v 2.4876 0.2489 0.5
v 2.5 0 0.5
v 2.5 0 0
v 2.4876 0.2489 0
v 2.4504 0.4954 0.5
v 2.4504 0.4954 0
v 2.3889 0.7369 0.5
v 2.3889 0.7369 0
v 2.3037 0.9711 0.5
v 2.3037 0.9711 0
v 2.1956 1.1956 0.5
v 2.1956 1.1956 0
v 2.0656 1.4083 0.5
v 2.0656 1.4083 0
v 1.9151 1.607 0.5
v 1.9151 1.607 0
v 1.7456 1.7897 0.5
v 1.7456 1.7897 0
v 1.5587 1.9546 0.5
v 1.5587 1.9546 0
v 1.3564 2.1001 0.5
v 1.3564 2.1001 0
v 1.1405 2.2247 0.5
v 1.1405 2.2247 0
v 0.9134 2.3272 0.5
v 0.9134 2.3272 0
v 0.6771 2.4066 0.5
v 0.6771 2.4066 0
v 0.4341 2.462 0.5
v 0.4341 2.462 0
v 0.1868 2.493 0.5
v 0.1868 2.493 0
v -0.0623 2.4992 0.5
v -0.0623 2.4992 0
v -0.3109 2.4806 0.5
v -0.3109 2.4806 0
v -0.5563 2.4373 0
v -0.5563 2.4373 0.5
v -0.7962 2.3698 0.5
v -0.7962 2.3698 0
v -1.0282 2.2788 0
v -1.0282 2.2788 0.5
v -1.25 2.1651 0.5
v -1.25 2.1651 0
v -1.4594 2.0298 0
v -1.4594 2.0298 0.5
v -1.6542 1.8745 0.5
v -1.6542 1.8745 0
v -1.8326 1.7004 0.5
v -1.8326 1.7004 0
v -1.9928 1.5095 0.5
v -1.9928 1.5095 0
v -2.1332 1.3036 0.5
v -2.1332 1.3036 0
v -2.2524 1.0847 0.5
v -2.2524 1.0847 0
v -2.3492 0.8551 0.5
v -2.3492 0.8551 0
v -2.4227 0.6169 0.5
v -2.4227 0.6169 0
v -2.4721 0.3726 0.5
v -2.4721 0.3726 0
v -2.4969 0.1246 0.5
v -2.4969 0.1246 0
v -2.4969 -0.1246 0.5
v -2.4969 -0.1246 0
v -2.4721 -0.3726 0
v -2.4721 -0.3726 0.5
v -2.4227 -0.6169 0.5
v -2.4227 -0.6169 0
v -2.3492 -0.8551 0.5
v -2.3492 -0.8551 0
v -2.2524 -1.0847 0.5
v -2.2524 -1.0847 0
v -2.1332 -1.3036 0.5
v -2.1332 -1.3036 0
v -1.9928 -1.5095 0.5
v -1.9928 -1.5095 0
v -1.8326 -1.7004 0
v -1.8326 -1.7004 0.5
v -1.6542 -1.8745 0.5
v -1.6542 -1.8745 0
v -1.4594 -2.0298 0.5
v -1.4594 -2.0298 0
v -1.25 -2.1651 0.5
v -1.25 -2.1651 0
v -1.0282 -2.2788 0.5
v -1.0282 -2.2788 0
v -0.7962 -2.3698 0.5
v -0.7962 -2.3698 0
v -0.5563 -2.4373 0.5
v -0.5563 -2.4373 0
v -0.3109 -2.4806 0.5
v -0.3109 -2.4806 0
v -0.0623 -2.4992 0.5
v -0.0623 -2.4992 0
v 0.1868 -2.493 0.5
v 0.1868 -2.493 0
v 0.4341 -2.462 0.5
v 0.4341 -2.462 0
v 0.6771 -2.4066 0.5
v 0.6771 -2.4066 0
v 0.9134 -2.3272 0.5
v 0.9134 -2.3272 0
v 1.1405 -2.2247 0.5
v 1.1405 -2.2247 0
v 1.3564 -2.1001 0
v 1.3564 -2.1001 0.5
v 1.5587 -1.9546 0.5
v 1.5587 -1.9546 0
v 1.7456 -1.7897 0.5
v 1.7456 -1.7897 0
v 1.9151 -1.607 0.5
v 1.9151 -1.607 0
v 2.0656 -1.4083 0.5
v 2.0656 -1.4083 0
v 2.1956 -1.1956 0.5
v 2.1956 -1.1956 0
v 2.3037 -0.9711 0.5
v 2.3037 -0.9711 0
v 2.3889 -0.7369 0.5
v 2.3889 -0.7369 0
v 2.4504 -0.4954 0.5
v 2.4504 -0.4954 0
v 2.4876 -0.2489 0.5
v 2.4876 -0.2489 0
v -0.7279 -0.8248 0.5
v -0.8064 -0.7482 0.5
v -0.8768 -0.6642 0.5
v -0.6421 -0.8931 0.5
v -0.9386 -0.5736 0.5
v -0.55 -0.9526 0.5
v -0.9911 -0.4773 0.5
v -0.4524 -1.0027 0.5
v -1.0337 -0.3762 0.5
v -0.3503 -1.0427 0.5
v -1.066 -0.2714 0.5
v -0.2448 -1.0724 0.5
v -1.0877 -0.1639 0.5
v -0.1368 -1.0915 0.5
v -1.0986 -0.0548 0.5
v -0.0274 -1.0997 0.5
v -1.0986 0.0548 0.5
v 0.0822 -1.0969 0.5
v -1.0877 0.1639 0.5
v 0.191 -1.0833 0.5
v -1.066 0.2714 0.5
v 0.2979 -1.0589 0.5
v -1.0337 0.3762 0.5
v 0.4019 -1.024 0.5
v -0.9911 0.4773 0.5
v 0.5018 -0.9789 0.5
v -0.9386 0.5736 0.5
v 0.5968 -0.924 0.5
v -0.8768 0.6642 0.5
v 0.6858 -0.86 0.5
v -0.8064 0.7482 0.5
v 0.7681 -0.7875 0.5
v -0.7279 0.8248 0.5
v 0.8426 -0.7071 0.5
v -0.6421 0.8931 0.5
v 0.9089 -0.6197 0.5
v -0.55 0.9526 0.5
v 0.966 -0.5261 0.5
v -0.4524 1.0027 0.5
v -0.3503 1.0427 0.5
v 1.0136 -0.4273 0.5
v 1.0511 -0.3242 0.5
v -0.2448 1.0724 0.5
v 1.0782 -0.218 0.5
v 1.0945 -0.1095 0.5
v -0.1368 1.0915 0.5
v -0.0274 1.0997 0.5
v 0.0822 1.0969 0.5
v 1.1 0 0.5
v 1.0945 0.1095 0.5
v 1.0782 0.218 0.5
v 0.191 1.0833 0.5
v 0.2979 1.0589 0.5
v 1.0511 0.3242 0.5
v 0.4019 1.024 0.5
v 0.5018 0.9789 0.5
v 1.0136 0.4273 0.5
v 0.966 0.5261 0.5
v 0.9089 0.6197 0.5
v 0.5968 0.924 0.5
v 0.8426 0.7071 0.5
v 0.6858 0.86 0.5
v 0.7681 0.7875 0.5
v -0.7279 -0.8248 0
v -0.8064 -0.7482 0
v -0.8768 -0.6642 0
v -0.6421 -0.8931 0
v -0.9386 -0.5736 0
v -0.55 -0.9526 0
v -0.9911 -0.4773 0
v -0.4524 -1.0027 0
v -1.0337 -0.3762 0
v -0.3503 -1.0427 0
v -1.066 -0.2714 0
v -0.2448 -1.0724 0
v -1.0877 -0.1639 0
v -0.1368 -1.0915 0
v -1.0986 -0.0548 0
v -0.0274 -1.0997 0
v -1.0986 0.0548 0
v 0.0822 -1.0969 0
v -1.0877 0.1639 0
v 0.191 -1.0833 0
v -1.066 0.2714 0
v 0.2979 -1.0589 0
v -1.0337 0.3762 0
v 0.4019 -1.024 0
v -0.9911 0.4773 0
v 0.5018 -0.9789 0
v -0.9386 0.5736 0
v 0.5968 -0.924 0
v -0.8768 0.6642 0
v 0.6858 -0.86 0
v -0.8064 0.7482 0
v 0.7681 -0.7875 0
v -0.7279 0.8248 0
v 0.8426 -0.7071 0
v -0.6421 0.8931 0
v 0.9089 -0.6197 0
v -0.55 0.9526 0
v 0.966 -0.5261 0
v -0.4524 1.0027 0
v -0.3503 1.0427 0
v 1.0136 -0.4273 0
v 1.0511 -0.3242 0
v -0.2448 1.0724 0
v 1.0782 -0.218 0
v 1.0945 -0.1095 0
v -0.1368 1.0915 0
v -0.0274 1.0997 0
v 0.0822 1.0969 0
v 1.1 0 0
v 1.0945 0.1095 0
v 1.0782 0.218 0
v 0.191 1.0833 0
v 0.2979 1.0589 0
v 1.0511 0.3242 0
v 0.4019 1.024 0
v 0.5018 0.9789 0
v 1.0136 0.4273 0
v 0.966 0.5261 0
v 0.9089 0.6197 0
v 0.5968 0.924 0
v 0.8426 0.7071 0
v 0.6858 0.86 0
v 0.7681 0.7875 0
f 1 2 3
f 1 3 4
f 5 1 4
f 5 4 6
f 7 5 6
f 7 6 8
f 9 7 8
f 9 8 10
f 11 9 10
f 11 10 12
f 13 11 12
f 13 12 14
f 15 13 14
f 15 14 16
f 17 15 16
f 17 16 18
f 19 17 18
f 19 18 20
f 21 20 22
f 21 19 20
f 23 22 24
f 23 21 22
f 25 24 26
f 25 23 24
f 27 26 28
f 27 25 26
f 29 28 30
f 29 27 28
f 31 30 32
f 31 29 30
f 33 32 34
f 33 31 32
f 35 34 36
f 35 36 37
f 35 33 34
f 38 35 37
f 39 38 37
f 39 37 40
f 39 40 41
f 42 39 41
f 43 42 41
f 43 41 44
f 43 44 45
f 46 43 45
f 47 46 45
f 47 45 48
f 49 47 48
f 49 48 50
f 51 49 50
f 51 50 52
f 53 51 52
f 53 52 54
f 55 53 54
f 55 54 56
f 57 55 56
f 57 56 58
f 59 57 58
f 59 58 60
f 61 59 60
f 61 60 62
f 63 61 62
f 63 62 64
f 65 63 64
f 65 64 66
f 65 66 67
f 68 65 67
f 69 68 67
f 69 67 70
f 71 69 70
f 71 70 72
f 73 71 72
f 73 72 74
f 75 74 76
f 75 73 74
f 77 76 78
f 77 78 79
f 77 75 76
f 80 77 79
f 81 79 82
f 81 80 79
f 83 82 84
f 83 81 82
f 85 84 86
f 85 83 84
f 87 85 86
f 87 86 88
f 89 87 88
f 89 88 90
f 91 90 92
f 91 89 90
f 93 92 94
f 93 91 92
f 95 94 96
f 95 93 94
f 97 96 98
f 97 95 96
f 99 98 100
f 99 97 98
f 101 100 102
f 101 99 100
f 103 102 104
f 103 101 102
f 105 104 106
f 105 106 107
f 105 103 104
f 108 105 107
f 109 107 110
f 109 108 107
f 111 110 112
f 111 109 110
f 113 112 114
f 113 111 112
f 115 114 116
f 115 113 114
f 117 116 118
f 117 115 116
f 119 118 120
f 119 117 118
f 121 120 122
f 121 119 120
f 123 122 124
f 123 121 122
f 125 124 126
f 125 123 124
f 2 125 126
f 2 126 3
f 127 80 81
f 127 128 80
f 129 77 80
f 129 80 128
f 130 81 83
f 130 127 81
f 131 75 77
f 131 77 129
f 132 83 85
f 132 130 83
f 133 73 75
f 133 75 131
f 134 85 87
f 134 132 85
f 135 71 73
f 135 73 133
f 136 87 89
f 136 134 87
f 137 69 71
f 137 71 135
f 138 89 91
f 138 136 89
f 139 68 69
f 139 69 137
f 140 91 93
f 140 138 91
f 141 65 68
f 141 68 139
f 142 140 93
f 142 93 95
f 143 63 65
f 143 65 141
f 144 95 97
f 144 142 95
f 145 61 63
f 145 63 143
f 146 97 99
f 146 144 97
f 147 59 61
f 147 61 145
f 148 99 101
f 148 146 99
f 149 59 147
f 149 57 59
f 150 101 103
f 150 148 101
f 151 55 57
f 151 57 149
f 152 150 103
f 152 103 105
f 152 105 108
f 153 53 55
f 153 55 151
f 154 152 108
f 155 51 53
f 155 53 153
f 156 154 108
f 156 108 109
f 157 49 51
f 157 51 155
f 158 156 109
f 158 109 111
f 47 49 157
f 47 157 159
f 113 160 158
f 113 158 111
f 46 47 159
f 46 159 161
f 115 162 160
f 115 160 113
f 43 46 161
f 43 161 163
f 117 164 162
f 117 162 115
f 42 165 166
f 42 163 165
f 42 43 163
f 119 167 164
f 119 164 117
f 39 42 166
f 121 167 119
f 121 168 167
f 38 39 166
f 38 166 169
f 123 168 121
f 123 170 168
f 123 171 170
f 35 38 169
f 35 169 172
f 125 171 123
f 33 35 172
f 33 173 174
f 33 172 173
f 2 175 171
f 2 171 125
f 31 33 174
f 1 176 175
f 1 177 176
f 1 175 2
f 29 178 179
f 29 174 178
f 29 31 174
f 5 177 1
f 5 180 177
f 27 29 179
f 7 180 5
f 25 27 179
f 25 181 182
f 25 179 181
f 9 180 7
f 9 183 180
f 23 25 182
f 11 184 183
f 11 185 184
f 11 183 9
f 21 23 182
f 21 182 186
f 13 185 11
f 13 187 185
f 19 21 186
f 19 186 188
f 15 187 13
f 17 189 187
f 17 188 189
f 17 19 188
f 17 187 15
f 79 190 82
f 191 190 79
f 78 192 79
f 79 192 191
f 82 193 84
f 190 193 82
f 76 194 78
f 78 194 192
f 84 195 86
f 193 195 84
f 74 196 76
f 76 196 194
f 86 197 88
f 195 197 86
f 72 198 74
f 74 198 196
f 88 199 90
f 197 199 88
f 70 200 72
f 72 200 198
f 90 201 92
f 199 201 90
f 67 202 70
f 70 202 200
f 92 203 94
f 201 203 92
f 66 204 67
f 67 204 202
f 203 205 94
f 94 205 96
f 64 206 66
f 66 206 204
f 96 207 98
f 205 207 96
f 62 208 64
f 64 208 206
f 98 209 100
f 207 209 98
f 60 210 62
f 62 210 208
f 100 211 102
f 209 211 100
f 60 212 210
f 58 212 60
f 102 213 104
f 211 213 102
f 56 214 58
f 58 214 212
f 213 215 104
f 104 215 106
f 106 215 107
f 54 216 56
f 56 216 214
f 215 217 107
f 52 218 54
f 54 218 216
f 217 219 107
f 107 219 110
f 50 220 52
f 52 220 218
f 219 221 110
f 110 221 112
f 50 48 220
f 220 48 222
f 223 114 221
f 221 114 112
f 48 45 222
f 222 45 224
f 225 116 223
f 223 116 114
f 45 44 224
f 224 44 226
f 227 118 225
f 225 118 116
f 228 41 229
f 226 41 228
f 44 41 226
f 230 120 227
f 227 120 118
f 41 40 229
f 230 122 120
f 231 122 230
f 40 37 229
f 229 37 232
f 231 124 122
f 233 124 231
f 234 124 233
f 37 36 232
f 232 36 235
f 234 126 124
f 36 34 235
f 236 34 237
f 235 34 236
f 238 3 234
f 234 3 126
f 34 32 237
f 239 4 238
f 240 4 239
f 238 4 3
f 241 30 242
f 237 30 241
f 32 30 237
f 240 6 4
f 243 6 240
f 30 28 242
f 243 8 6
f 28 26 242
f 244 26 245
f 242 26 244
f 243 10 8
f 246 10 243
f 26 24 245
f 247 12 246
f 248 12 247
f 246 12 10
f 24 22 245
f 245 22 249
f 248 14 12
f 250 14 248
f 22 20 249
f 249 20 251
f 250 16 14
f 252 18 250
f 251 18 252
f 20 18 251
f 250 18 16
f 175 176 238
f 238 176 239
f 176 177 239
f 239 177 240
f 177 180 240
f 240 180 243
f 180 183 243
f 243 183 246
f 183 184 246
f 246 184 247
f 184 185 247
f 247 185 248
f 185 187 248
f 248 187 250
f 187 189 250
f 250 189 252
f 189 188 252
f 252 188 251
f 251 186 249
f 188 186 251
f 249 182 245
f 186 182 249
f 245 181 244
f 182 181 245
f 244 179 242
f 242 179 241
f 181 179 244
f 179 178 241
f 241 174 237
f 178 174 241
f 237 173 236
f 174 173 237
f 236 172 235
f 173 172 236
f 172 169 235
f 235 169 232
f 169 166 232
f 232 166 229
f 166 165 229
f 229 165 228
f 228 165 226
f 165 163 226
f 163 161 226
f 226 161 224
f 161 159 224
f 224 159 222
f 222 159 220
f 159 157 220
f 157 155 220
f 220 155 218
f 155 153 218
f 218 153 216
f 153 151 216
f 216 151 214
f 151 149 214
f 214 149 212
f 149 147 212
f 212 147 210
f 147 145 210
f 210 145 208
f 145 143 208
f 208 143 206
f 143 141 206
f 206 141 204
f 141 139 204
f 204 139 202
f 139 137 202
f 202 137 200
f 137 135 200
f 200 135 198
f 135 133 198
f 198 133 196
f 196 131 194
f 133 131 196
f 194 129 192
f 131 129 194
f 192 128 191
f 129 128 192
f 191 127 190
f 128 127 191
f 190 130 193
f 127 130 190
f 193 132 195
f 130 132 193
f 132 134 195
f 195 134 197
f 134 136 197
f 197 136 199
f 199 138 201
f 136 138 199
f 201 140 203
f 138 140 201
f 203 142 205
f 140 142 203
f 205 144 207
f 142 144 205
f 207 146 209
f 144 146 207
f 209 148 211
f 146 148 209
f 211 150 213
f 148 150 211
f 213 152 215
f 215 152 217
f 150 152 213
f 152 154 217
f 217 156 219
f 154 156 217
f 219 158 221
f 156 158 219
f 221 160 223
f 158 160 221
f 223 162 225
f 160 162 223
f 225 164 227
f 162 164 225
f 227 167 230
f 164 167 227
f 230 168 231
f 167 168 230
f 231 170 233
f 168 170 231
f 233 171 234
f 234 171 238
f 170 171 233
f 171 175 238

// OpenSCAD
// Generated by the canonical parent Python sources and validated exchange pipeline.
polyhedron(points=[[2.487576961517334, 0.24891962110996246, 0.5], [2.5, -1.0000000036274937e-15, 0.5], [2.5, -1.0000000036274937e-15, 0.0], [2.487576961517334, 0.24891962110996246, 0.0], [2.4504311084747314, 0.49536535143852234, 0.5], [2.4504311084747314, 0.49536535143852234, 0.0], [2.3889319896698, 0.7368879318237305, 0.5], [2.3889319896698, 0.7368879318237305, 0.0], [2.3036904335021973, 0.9710869789123535, 0.5], [2.3036904335021973, 0.9710869789123535, 0.0], [2.19555401802063, 1.1956349611282349, 0.5], [2.19555401802063, 1.1956349611282349, 0.0], [2.06559681892395, 1.4083001613616943, 0.5], [2.06559681892395, 1.4083001613616943, 0.0], [1.9151110649108887, 1.6069689989089966, 0.5], [1.9151110649108887, 1.6069689989089966, 0.0], [1.7455919981002808, 1.7896671295166016, 0.5], [1.7455919981002808, 1.7896671295166016, 0.0], [1.5587245225906372, 1.9545787572860718, 0.5], [1.5587245225906372, 1.9545787572860718, 0.0], [1.35636568069458, 2.100064754486084, 0.5], [1.35636568069458, 2.100064754486084, 0.0], [1.1405266523361206, 2.224679470062256, 0.5], [1.1405266523361206, 2.224679470062256, 0.0], [0.9133525490760803, 2.3271844387054443, 0.5], [0.9133525490760803, 2.3271844387054443, 0.0], [0.677101194858551, 2.4065606594085693, 0.5], [0.677101194858551, 2.4065606594085693, 0.0], [0.43412044644355774, 2.462019443511963, 0.5], [0.43412044644355774, 2.462019443511963, 0.0], [0.186825230717659, 2.493009567260742, 0.5], [0.186825230717659, 2.493009567260742, 0.0], [-0.06232672929763794, 2.499222993850708, 0.5], [-0.06232672929763794, 2.499222993850708, 0.0], [-0.3108592629432678, 2.480597972869873, 0.5], [-0.3108592629432678, 2.480597972869873, 0.0], [-0.5563023090362549, 2.437319755554199, 0.0], [-0.5563023090362549, 2.437319755554199, 0.5], [-0.796216607093811, 2.3698184490203857, 0.5], [-0.796216607093811, 2.3698184490203857, 0.0], [-1.0282177925109863, 2.2787647247314453, 0.0], [-1.0282177925109863, 2.2787647247314453, 0.5], [-1.25, 2.1650636196136475, 0.5], [-1.25, 2.1650636196136475, 0.0], [-1.4593591690063477, 2.0298449993133545, 0.0], [-1.4593591690063477, 2.0298449993133545, 0.5], [-1.65421462059021, 1.8744529485702515, 0.5], [-1.65421462059021, 1.8744529485702515, 0.0], [-1.832629680633545, 1.7004318237304688, 0.5], [-1.832629680633545, 1.7004318237304688, 0.0], [-1.9928312301635742, 1.5095109939575195, 0.5], [-1.9928312301635742, 1.5095109939575195, 0.0], [-2.1332271099090576, 1.3035880327224731, 0.5], [-2.1332271099090576, 1.3035880327224731, 0.0], [-2.2524220943450928, 1.0847094058990479, 0.5], [-2.2524220943450928, 1.0847094058990479, 0.0], [-2.349231481552124, 0.8550503849983215, 0.5], [-2.349231481552124, 0.8550503849983215, 0.0], [-2.4226932525634766, 0.616893470287323, 0.5], [-2.4226932525634766, 0.616893470287323, 0.0], [-2.4720771312713623, 0.37260565161705017, 0.5], [-2.4720771312713623, 0.37260565161705017, 0.0], [-2.496892213821411, 0.12461471557617188, 0.5], [-2.496892213821411, 0.12461471557617188, 0.0], [-2.496892213821411, -0.12461471557617188, 0.5], [-2.496892213821411, -0.12461471557617188, 0.0], [-2.4720771312713623, -0.37260565161705017, 0.0], [-2.4720771312713623, -0.37260565161705017, 0.5], [-2.4226932525634766, -0.616893470287323, 0.5], [-2.4226932525634766, -0.616893470287323, 0.0], [-2.349231481552124, -0.8550503849983215, 0.5], [-2.349231481552124, -0.8550503849983215, 0.0], [-2.2524220943450928, -1.0847094058990479, 0.5], [-2.2524220943450928, -1.0847094058990479, 0.0], [-2.1332271099090576, -1.3035880327224731, 0.5], [-2.1332271099090576, -1.3035880327224731, 0.0], [-1.9928312301635742, -1.5095109939575195, 0.5], [-1.9928312301635742, -1.5095109939575195, 0.0], [-1.832629680633545, -1.7004318237304688, 0.0], [-1.832629680633545, -1.7004318237304688, 0.5], [-1.65421462059021, -1.8744529485702515, 0.5], [-1.65421462059021, -1.8744529485702515, 0.0], [-1.4593591690063477, -2.0298449993133545, 0.5], [-1.4593591690063477, -2.0298449993133545, 0.0], [-1.25, -2.1650636196136475, 0.5], [-1.25, -2.1650636196136475, 0.0], [-1.0282177925109863, -2.2787647247314453, 0.5], [-1.0282177925109863, -2.2787647247314453, 0.0], [-0.796216607093811, -2.3698184490203857, 0.5], [-0.796216607093811, -2.3698184490203857, 0.0], [-0.5563023090362549, -2.437319755554199, 0.5], [-0.5563023090362549, -2.437319755554199, 0.0], [-0.3108592629432678, -2.480597972869873, 0.5], [-0.3108592629432678, -2.480597972869873, 0.0], [-0.06232672929763794, -2.499222993850708, 0.5], [-0.06232672929763794, -2.499222993850708, 0.0], [0.186825230717659, -2.493009567260742, 0.5], [0.186825230717659, -2.493009567260742, 0.0], [0.43412044644355774, -2.462019443511963, 0.5], [0.43412044644355774, -2.462019443511963, 0.0], [0.677101194858551, -2.4065606594085693, 0.5], [0.677101194858551, -2.4065606594085693, 0.0], [0.9133525490760803, -2.3271844387054443, 0.5], [0.9133525490760803, -2.3271844387054443, 0.0], [1.1405266523361206, -2.224679470062256, 0.5], [1.1405266523361206, -2.224679470062256, 0.0], [1.35636568069458, -2.100064754486084, 0.0], [1.35636568069458, -2.100064754486084, 0.5], [1.5587245225906372, -1.9545787572860718, 0.5], [1.5587245225906372, -1.9545787572860718, 0.0], [1.7455919981002808, -1.7896671295166016, 0.5], [1.7455919981002808, -1.7896671295166016, 0.0], [1.9151110649108887, -1.6069689989089966, 0.5], [1.9151110649108887, -1.6069689989089966, 0.0], [2.06559681892395, -1.4083001613616943, 0.5], [2.06559681892395, -1.4083001613616943, 0.0], [2.19555401802063, -1.1956349611282349, 0.5], [2.19555401802063, -1.1956349611282349, 0.0], [2.3036904335021973, -0.9710869789123535, 0.5], [2.3036904335021973, -0.9710869789123535, 0.0], [2.3889319896698, -0.7368879318237305, 0.5], [2.3889319896698, -0.7368879318237305, 0.0], [2.4504311084747314, -0.49536535143852234, 0.5], [2.4504311084747314, -0.49536535143852234, 0.0], [2.487576961517334, -0.24891962110996246, 0.5], [2.487576961517334, -0.24891962110996246, 0.0], [-0.7278544306755066, -0.824759304523468, 0.5], [-0.8063570857048035, -0.7481899857521057, 0.5], [-0.8768457770347595, -0.6641848683357239, 0.5], [-0.6421180367469788, -0.8931317925453186, 0.5], [-0.9386199712753296, -0.5735787153244019, 0.5], [-0.550000011920929, -0.952627956867218, 0.5], [-0.9910657405853271, -0.4772721230983734, 0.5], [-0.4524158239364624, -1.0026564598083496, 0.5], [-1.0336618423461914, -0.376222163438797, 0.5], [-0.35033532977104187, -1.042720079421997, 0.5], [-1.0659849643707275, -0.27143314480781555, 0.5], [-0.2447730302810669, -1.0724207162857056, 0.5], [-1.0877139568328857, -0.1639464944601059, 0.5], [-0.1367780715227127, -1.0914630889892578, 0.5], [-1.098632574081421, -0.05483047291636467, 0.5], [-0.027423761785030365, -1.0996581315994263, 0.5], [-1.098632574081421, 0.05483047291636467, 0.5], [0.08220310509204865, -1.0969241857528687, 0.5], [-1.0877139568328857, 0.1639464944601059, 0.5], [0.19101299345493317, -1.083288550376892, 0.5], [-1.0659849643707275, 0.27143314480781555, 0.5], [0.2979245185852051, -1.0588866472244263, 0.5], [-1.0336618423461914, 0.376222163438797, 0.5], [0.4018751382827759, -1.023961067199707, 0.5], [-0.9910657405853271, 0.4772721230983734, 0.5], [0.5018317103385925, -0.978859007358551, 0.5], [-0.9386199712753296, 0.5735787153244019, 0.5], [0.5968008637428284, -0.9240285158157349, 0.5], [-0.8768457770347595, 0.6641848683357239, 0.5], [0.6858387589454651, -0.8600146174430847, 0.5], [-0.8063570857048035, 0.7481899857521057, 0.5], [0.7680605053901672, -0.7874535322189331, 0.5], [-0.7278544306755066, 0.824759304523468, 0.5], [0.8426488637924194, -0.7070663571357727, 0.5], [-0.6421180367469788, 0.8931317925453186, 0.5], [0.9088626503944397, -0.6196520924568176, 0.5], [-0.550000011920929, 0.952627956867218, 0.5], [0.9660437107086182, -0.5260793566703796, 0.5], [-0.4524158239364624, 1.0026564598083496, 0.5], [-0.35033532977104187, 1.042720079421997, 0.5], [1.013623833656311, -0.4272782802581787, 0.5], [1.0511300563812256, -0.32423070073127747, 0.5], [-0.2447730302810669, 1.0724207162857056, 0.5], [1.078189730644226, -0.21796075999736786, 0.5], [1.0945338010787964, -0.10952463001012802, 0.5], [-0.1367780715227127, 1.0914630889892578, 0.5], [-0.027423761785030365, 1.0996581315994263, 0.5], [0.08220310509204865, 1.0969241857528687, 0.5], [1.100000023841858, 0.0, 0.5], [1.0945338010787964, 0.10952463001012802, 0.5], [1.078189730644226, 0.21796075999736786, 0.5], [0.19101299345493317, 1.083288550376892, 0.5], [0.2979245185852051, 1.0588866472244263, 0.5], [1.0511300563812256, 0.32423070073127747, 0.5], [0.4018751382827759, 1.023961067199707, 0.5], [0.5018317103385925, 0.978859007358551, 0.5], [1.013623833656311, 0.4272782802581787, 0.5], [0.9660437107086182, 0.5260793566703796, 0.5], [0.9088626503944397, 0.6196520924568176, 0.5], [0.5968008637428284, 0.9240285158157349, 0.5], [0.8426488637924194, 0.7070663571357727, 0.5], [0.6858387589454651, 0.8600146174430847, 0.5], [0.7680605053901672, 0.7874535322189331, 0.5], [-0.7278544306755066, -0.824759304523468, 0.0], [-0.8063570857048035, -0.7481899857521057, 0.0], [-0.8768457770347595, -0.6641848683357239, 0.0], [-0.6421180367469788, -0.8931317925453186, 0.0], [-0.9386199712753296, -0.5735787153244019, 0.0], [-0.550000011920929, -0.952627956867218, 0.0], [-0.9910657405853271, -0.4772721230983734, 0.0], [-0.4524158239364624, -1.0026564598083496, 0.0], [-1.0336618423461914, -0.376222163438797, 0.0], [-0.35033532977104187, -1.042720079421997, 0.0], [-1.0659849643707275, -0.27143314480781555, 0.0], [-0.2447730302810669, -1.0724207162857056, 0.0], [-1.0877139568328857, -0.1639464944601059, 0.0], [-0.1367780715227127, -1.0914630889892578, 0.0], [-1.098632574081421, -0.05483047291636467, 0.0], [-0.027423761785030365, -1.0996581315994263, 0.0], [-1.098632574081421, 0.05483047291636467, 0.0], [0.08220310509204865, -1.0969241857528687, 0.0], [-1.0877139568328857, 0.1639464944601059, 0.0], [0.19101299345493317, -1.083288550376892, 0.0], [-1.0659849643707275, 0.27143314480781555, 0.0], [0.2979245185852051, -1.0588866472244263, 0.0], [-1.0336618423461914, 0.376222163438797, 0.0], [0.4018751382827759, -1.023961067199707, 0.0], [-0.9910657405853271, 0.4772721230983734, 0.0], [0.5018317103385925, -0.978859007358551, 0.0], [-0.9386199712753296, 0.5735787153244019, 0.0], [0.5968008637428284, -0.9240285158157349, 0.0], [-0.8768457770347595, 0.6641848683357239, 0.0], [0.6858387589454651, -0.8600146174430847, 0.0], [-0.8063570857048035, 0.7481899857521057, 0.0], [0.7680605053901672, -0.7874535322189331, 0.0], [-0.7278544306755066, 0.824759304523468, 0.0], [0.8426488637924194, -0.7070663571357727, 0.0], [-0.6421180367469788, 0.8931317925453186, 0.0], [0.9088626503944397, -0.6196520924568176, 0.0], [-0.550000011920929, 0.952627956867218, 0.0], [0.9660437107086182, -0.5260793566703796, 0.0], [-0.4524158239364624, 1.0026564598083496, 0.0], [-0.35033532977104187, 1.042720079421997, 0.0], [1.013623833656311, -0.4272782802581787, 0.0], [1.0511300563812256, -0.32423070073127747, 0.0], [-0.2447730302810669, 1.0724207162857056, 0.0], [1.078189730644226, -0.21796075999736786, 0.0], [1.0945338010787964, -0.10952463001012802, 0.0], [-0.1367780715227127, 1.0914630889892578, 0.0], [-0.027423761785030365, 1.0996581315994263, 0.0], [0.08220310509204865, 1.0969241857528687, 0.0], [1.100000023841858, 0.0, 0.0], [1.0945338010787964, 0.10952463001012802, 0.0], [1.078189730644226, 0.21796075999736786, 0.0], [0.19101299345493317, 1.083288550376892, 0.0], [0.2979245185852051, 1.0588866472244263, 0.0], [1.0511300563812256, 0.32423070073127747, 0.0], [0.4018751382827759, 1.023961067199707, 0.0], [0.5018317103385925, 0.978859007358551, 0.0], [1.013623833656311, 0.4272782802581787, 0.0], [0.9660437107086182, 0.5260793566703796, 0.0], [0.9088626503944397, 0.6196520924568176, 0.0], [0.5968008637428284, 0.9240285158157349, 0.0], [0.8426488637924194, 0.7070663571357727, 0.0], [0.6858387589454651, 0.8600146174430847, 0.0], [0.7680605053901672, 0.7874535322189331, 0.0]],faces=[[2, 1, 0], [3, 2, 0], [3, 0, 4], [5, 3, 4], [5, 4, 6], [7, 5, 6], [7, 6, 8], [9, 7, 8], [9, 8, 10], [11, 9, 10], [11, 10, 12], [13, 11, 12], [13, 12, 14], [15, 13, 14], [15, 14, 16], [17, 15, 16], [17, 16, 18], [19, 17, 18], [21, 19, 20], [19, 18, 20], [23, 21, 22], [21, 20, 22], [25, 23, 24], [23, 22, 24], [27, 25, 26], [25, 24, 26], [29, 27, 28], [27, 26, 28], [31, 29, 30], [29, 28, 30], [33, 31, 32], [31, 30, 32], [35, 33, 34], [36, 35, 34], [33, 32, 34], [36, 34, 37], [36, 37, 38], [39, 36, 38], [40, 39, 38], [40, 38, 41], [40, 41, 42], [43, 40, 42], [44, 43, 42], [44, 42, 45], [44, 45, 46], [47, 44, 46], [47, 46, 48], [49, 47, 48], [49, 48, 50], [51, 49, 50], [51, 50, 52], [53, 51, 52], [53, 52, 54], [55, 53, 54], [55, 54, 56], [57, 55, 56], [57, 56, 58], [59, 57, 58], [59, 58, 60], [61, 59, 60], [61, 60, 62], [63, 61, 62], [63, 62, 64], [65, 63, 64], [66, 65, 64], [66, 64, 67], [66, 67, 68], [69, 66, 68], [69, 68, 70], [71, 69, 70], [71, 70, 72], [73, 71, 72], [75, 73, 74], [73, 72, 74], [77, 75, 76], [78, 77, 76], [75, 74, 76], [78, 76, 79], [81, 78, 80], [78, 79, 80], [83, 81, 82], [81, 80, 82], [85, 83, 84], [83, 82, 84], [85, 84, 86], [87, 85, 86], [87, 86, 88], [89, 87, 88], [91, 89, 90], [89, 88, 90], [93, 91, 92], [91, 90, 92], [95, 93, 94], [93, 92, 94], [97, 95, 96], [95, 94, 96], [99, 97, 98], [97, 96, 98], [101, 99, 100], [99, 98, 100], [103, 101, 102], [101, 100, 102], [105, 103, 104], [106, 105, 104], [103, 102, 104], [106, 104, 107], [109, 106, 108], [106, 107, 108], [111, 109, 110], [109, 108, 110], [113, 111, 112], [111, 110, 112], [115, 113, 114], [113, 112, 114], [117, 115, 116], [115, 114, 116], [119, 117, 118], [117, 116, 118], [121, 119, 120], [119, 118, 120], [123, 121, 122], [121, 120, 122], [125, 123, 124], [123, 122, 124], [125, 124, 1], [2, 125, 1], [80, 79, 126], [79, 127, 126], [79, 76, 128], [127, 79, 128], [82, 80, 129], [80, 126, 129], [76, 74, 130], [128, 76, 130], [84, 82, 131], [82, 129, 131], [74, 72, 132], [130, 74, 132], [86, 84, 133], [84, 131, 133], [72, 70, 134], [132, 72, 134], [88, 86, 135], [86, 133, 135], [70, 68, 136], [134, 70, 136], [90, 88, 137], [88, 135, 137], [68, 67, 138], [136, 68, 138], [92, 90, 139], [90, 137, 139], [67, 64, 140], [138, 67, 140], [92, 139, 141], [94, 92, 141], [64, 62, 142], [140, 64, 142], [96, 94, 143], [94, 141, 143], [62, 60, 144], [142, 62, 144], [98, 96, 145], [96, 143, 145], [60, 58, 146], [144, 60, 146], [100, 98, 147], [98, 145, 147], [146, 58, 148], [58, 56, 148], [102, 100, 149], [100, 147, 149], [56, 54, 150], [148, 56, 150], [102, 149, 151], [104, 102, 151], [107, 104, 151], [54, 52, 152], [150, 54, 152], [107, 151, 153], [52, 50, 154], [152, 52, 154], [107, 153, 155], [108, 107, 155], [50, 48, 156], [154, 50, 156], [108, 155, 157], [110, 108, 157], [156, 48, 46], [158, 156, 46], [157, 159, 112], [110, 157, 112], [158, 46, 45], [160, 158, 45], [159, 161, 114], [112, 159, 114], [160, 45, 42], [162, 160, 42], [161, 163, 116], [114, 161, 116], [165, 164, 41], [164, 162, 41], [162, 42, 41], [163, 166, 118], [116, 163, 118], [165, 41, 38], [118, 166, 120], [166, 167, 120], [165, 38, 37], [168, 165, 37], [120, 167, 122], [167, 169, 122], [169, 170, 122], [168, 37, 34], [171, 168, 34], [122, 170, 124], [171, 34, 32], [173, 172, 32], [172, 171, 32], [170, 174, 1], [124, 170, 1], [173, 32, 30], [174, 175, 0], [175, 176, 0], [1, 174, 0], [178, 177, 28], [177, 173, 28], [173, 30, 28], [0, 176, 4], [176, 179, 4], [178, 28, 26], [4, 179, 6], [178, 26, 24], [181, 180, 24], [180, 178, 24], [6, 179, 8], [179, 182, 8], [181, 24, 22], [182, 183, 10], [183, 184, 10], [8, 182, 10], [181, 22, 20], [185, 181, 20], [10, 184, 12], [184, 186, 12], [185, 20, 18], [187, 185, 18], [12, 186, 14], [186, 188, 16], [188, 187, 16], [187, 18, 16], [14, 186, 16], [81, 189, 78], [78, 189, 190], [78, 191, 77], [190, 191, 78], [83, 192, 81], [81, 192, 189], [77, 193, 75], [191, 193, 77], [85, 194, 83], [83, 194, 192], [75, 195, 73], [193, 195, 75], [87, 196, 85], [85, 196, 194], [73, 197, 71], [195, 197, 73], [89, 198, 87], [87, 198, 196], [71, 199, 69], [197, 199, 71], [91, 200, 89], [89, 200, 198], [69, 201, 66], [199, 201, 69], [93, 202, 91], [91, 202, 200], [66, 203, 65], [201, 203, 66], [93, 204, 202], [95, 204, 93], [65, 205, 63], [203, 205, 65], [97, 206, 95], [95, 206, 204], [63, 207, 61], [205, 207, 63], [99, 208, 97], [97, 208, 206], [61, 209, 59], [207, 209, 61], [101, 210, 99], [99, 210, 208], [209, 211, 59], [59, 211, 57], [103, 212, 101], [101, 212, 210], [57, 213, 55], [211, 213, 57], [103, 214, 212], [105, 214, 103], [106, 214, 105], [55, 215, 53], [213, 215, 55], [106, 216, 214], [53, 217, 51], [215, 217, 53], [106, 218, 216], [109, 218, 106], [51, 219, 49], [217, 219, 51], [109, 220, 218], [111, 220, 109], [219, 47, 49], [221, 47, 219], [220, 113, 222], [111, 113, 220], [221, 44, 47], [223, 44, 221], [222, 115, 224], [113, 115, 222], [223, 43, 44], [225, 43, 223], [224, 117, 226], [115, 117, 224], [228, 40, 227], [227, 40, 225], [225, 40, 43], [226, 119, 229], [117, 119, 226], [228, 39, 40], [119, 121, 229], [229, 121, 230], [228, 36, 39], [231, 36, 228], [121, 123, 230], [230, 123, 232], [232, 123, 233], [231, 35, 36], [234, 35, 231], [123, 125, 233], [234, 33, 35], [236, 33, 235], [235, 33, 234], [233, 2, 237], [125, 2, 233], [236, 31, 33], [237, 3, 238], [238, 3, 239], [2, 3, 237], [241, 29, 240], [240, 29, 236], [236, 29, 31], [3, 5, 239], [239, 5, 242], [241, 27, 29], [5, 7, 242], [241, 25, 27], [244, 25, 243], [243, 25, 241], [7, 9, 242], [242, 9, 245], [244, 23, 25], [245, 11, 246], [246, 11, 247], [9, 11, 245], [244, 21, 23], [248, 21, 244], [11, 13, 247], [247, 13, 249], [248, 19, 21], [250, 19, 248], [13, 15, 249], [249, 17, 251], [251, 17, 250], [250, 17, 19], [15, 17, 249], [237, 175, 174], [238, 175, 237], [238, 176, 175], [239, 176, 238], [239, 179, 176], [242, 179, 239], [242, 182, 179], [245, 182, 242], [245, 183, 182], [246, 183, 245], [246, 184, 183], [247, 184, 246], [247, 186, 184], [249, 186, 247], [249, 188, 186], [251, 188, 249], [251, 187, 188], [250, 187, 251], [248, 185, 250], [250, 185, 187], [244, 181, 248], [248, 181, 185], [243, 180, 244], [244, 180, 181], [241, 178, 243], [240, 178, 241], [243, 178, 180], [240, 177, 178], [236, 173, 240], [240, 173, 177], [235, 172, 236], [236, 172, 173], [234, 171, 235], [235, 171, 172], [234, 168, 171], [231, 168, 234], [231, 165, 168], [228, 165, 231], [228, 164, 165], [227, 164, 228], [225, 164, 227], [225, 162, 164], [225, 160, 162], [223, 160, 225], [223, 158, 160], [221, 158, 223], [219, 158, 221], [219, 156, 158], [219, 154, 156], [217, 154, 219], [217, 152, 154], [215, 152, 217], [215, 150, 152], [213, 150, 215], [213, 148, 150], [211, 148, 213], [211, 146, 148], [209, 146, 211], [209, 144, 146], [207, 144, 209], [207, 142, 144], [205, 142, 207], [205, 140, 142], [203, 140, 205], [203, 138, 140], [201, 138, 203], [201, 136, 138], [199, 136, 201], [199, 134, 136], [197, 134, 199], [197, 132, 134], [195, 132, 197], [193, 130, 195], [195, 130, 132], [191, 128, 193], [193, 128, 130], [190, 127, 191], [191, 127, 128], [189, 126, 190], [190, 126, 127], [192, 129, 189], [189, 129, 126], [194, 131, 192], [192, 131, 129], [194, 133, 131], [196, 133, 194], [196, 135, 133], [198, 135, 196], [200, 137, 198], [198, 137, 135], [202, 139, 200], [200, 139, 137], [204, 141, 202], [202, 141, 139], [206, 143, 204], [204, 143, 141], [208, 145, 206], [206, 145, 143], [210, 147, 208], [208, 147, 145], [212, 149, 210], [210, 149, 147], [214, 151, 212], [216, 151, 214], [212, 151, 149], [216, 153, 151], [218, 155, 216], [216, 155, 153], [220, 157, 218], [218, 157, 155], [222, 159, 220], [220, 159, 157], [224, 161, 222], [222, 161, 159], [226, 163, 224], [224, 163, 161], [229, 166, 226], [226, 166, 163], [230, 167, 229], [229, 167, 166], [232, 169, 230], [230, 169, 167], [233, 170, 232], [237, 170, 233], [232, 170, 169], [237, 174, 170]],convexity=10);
